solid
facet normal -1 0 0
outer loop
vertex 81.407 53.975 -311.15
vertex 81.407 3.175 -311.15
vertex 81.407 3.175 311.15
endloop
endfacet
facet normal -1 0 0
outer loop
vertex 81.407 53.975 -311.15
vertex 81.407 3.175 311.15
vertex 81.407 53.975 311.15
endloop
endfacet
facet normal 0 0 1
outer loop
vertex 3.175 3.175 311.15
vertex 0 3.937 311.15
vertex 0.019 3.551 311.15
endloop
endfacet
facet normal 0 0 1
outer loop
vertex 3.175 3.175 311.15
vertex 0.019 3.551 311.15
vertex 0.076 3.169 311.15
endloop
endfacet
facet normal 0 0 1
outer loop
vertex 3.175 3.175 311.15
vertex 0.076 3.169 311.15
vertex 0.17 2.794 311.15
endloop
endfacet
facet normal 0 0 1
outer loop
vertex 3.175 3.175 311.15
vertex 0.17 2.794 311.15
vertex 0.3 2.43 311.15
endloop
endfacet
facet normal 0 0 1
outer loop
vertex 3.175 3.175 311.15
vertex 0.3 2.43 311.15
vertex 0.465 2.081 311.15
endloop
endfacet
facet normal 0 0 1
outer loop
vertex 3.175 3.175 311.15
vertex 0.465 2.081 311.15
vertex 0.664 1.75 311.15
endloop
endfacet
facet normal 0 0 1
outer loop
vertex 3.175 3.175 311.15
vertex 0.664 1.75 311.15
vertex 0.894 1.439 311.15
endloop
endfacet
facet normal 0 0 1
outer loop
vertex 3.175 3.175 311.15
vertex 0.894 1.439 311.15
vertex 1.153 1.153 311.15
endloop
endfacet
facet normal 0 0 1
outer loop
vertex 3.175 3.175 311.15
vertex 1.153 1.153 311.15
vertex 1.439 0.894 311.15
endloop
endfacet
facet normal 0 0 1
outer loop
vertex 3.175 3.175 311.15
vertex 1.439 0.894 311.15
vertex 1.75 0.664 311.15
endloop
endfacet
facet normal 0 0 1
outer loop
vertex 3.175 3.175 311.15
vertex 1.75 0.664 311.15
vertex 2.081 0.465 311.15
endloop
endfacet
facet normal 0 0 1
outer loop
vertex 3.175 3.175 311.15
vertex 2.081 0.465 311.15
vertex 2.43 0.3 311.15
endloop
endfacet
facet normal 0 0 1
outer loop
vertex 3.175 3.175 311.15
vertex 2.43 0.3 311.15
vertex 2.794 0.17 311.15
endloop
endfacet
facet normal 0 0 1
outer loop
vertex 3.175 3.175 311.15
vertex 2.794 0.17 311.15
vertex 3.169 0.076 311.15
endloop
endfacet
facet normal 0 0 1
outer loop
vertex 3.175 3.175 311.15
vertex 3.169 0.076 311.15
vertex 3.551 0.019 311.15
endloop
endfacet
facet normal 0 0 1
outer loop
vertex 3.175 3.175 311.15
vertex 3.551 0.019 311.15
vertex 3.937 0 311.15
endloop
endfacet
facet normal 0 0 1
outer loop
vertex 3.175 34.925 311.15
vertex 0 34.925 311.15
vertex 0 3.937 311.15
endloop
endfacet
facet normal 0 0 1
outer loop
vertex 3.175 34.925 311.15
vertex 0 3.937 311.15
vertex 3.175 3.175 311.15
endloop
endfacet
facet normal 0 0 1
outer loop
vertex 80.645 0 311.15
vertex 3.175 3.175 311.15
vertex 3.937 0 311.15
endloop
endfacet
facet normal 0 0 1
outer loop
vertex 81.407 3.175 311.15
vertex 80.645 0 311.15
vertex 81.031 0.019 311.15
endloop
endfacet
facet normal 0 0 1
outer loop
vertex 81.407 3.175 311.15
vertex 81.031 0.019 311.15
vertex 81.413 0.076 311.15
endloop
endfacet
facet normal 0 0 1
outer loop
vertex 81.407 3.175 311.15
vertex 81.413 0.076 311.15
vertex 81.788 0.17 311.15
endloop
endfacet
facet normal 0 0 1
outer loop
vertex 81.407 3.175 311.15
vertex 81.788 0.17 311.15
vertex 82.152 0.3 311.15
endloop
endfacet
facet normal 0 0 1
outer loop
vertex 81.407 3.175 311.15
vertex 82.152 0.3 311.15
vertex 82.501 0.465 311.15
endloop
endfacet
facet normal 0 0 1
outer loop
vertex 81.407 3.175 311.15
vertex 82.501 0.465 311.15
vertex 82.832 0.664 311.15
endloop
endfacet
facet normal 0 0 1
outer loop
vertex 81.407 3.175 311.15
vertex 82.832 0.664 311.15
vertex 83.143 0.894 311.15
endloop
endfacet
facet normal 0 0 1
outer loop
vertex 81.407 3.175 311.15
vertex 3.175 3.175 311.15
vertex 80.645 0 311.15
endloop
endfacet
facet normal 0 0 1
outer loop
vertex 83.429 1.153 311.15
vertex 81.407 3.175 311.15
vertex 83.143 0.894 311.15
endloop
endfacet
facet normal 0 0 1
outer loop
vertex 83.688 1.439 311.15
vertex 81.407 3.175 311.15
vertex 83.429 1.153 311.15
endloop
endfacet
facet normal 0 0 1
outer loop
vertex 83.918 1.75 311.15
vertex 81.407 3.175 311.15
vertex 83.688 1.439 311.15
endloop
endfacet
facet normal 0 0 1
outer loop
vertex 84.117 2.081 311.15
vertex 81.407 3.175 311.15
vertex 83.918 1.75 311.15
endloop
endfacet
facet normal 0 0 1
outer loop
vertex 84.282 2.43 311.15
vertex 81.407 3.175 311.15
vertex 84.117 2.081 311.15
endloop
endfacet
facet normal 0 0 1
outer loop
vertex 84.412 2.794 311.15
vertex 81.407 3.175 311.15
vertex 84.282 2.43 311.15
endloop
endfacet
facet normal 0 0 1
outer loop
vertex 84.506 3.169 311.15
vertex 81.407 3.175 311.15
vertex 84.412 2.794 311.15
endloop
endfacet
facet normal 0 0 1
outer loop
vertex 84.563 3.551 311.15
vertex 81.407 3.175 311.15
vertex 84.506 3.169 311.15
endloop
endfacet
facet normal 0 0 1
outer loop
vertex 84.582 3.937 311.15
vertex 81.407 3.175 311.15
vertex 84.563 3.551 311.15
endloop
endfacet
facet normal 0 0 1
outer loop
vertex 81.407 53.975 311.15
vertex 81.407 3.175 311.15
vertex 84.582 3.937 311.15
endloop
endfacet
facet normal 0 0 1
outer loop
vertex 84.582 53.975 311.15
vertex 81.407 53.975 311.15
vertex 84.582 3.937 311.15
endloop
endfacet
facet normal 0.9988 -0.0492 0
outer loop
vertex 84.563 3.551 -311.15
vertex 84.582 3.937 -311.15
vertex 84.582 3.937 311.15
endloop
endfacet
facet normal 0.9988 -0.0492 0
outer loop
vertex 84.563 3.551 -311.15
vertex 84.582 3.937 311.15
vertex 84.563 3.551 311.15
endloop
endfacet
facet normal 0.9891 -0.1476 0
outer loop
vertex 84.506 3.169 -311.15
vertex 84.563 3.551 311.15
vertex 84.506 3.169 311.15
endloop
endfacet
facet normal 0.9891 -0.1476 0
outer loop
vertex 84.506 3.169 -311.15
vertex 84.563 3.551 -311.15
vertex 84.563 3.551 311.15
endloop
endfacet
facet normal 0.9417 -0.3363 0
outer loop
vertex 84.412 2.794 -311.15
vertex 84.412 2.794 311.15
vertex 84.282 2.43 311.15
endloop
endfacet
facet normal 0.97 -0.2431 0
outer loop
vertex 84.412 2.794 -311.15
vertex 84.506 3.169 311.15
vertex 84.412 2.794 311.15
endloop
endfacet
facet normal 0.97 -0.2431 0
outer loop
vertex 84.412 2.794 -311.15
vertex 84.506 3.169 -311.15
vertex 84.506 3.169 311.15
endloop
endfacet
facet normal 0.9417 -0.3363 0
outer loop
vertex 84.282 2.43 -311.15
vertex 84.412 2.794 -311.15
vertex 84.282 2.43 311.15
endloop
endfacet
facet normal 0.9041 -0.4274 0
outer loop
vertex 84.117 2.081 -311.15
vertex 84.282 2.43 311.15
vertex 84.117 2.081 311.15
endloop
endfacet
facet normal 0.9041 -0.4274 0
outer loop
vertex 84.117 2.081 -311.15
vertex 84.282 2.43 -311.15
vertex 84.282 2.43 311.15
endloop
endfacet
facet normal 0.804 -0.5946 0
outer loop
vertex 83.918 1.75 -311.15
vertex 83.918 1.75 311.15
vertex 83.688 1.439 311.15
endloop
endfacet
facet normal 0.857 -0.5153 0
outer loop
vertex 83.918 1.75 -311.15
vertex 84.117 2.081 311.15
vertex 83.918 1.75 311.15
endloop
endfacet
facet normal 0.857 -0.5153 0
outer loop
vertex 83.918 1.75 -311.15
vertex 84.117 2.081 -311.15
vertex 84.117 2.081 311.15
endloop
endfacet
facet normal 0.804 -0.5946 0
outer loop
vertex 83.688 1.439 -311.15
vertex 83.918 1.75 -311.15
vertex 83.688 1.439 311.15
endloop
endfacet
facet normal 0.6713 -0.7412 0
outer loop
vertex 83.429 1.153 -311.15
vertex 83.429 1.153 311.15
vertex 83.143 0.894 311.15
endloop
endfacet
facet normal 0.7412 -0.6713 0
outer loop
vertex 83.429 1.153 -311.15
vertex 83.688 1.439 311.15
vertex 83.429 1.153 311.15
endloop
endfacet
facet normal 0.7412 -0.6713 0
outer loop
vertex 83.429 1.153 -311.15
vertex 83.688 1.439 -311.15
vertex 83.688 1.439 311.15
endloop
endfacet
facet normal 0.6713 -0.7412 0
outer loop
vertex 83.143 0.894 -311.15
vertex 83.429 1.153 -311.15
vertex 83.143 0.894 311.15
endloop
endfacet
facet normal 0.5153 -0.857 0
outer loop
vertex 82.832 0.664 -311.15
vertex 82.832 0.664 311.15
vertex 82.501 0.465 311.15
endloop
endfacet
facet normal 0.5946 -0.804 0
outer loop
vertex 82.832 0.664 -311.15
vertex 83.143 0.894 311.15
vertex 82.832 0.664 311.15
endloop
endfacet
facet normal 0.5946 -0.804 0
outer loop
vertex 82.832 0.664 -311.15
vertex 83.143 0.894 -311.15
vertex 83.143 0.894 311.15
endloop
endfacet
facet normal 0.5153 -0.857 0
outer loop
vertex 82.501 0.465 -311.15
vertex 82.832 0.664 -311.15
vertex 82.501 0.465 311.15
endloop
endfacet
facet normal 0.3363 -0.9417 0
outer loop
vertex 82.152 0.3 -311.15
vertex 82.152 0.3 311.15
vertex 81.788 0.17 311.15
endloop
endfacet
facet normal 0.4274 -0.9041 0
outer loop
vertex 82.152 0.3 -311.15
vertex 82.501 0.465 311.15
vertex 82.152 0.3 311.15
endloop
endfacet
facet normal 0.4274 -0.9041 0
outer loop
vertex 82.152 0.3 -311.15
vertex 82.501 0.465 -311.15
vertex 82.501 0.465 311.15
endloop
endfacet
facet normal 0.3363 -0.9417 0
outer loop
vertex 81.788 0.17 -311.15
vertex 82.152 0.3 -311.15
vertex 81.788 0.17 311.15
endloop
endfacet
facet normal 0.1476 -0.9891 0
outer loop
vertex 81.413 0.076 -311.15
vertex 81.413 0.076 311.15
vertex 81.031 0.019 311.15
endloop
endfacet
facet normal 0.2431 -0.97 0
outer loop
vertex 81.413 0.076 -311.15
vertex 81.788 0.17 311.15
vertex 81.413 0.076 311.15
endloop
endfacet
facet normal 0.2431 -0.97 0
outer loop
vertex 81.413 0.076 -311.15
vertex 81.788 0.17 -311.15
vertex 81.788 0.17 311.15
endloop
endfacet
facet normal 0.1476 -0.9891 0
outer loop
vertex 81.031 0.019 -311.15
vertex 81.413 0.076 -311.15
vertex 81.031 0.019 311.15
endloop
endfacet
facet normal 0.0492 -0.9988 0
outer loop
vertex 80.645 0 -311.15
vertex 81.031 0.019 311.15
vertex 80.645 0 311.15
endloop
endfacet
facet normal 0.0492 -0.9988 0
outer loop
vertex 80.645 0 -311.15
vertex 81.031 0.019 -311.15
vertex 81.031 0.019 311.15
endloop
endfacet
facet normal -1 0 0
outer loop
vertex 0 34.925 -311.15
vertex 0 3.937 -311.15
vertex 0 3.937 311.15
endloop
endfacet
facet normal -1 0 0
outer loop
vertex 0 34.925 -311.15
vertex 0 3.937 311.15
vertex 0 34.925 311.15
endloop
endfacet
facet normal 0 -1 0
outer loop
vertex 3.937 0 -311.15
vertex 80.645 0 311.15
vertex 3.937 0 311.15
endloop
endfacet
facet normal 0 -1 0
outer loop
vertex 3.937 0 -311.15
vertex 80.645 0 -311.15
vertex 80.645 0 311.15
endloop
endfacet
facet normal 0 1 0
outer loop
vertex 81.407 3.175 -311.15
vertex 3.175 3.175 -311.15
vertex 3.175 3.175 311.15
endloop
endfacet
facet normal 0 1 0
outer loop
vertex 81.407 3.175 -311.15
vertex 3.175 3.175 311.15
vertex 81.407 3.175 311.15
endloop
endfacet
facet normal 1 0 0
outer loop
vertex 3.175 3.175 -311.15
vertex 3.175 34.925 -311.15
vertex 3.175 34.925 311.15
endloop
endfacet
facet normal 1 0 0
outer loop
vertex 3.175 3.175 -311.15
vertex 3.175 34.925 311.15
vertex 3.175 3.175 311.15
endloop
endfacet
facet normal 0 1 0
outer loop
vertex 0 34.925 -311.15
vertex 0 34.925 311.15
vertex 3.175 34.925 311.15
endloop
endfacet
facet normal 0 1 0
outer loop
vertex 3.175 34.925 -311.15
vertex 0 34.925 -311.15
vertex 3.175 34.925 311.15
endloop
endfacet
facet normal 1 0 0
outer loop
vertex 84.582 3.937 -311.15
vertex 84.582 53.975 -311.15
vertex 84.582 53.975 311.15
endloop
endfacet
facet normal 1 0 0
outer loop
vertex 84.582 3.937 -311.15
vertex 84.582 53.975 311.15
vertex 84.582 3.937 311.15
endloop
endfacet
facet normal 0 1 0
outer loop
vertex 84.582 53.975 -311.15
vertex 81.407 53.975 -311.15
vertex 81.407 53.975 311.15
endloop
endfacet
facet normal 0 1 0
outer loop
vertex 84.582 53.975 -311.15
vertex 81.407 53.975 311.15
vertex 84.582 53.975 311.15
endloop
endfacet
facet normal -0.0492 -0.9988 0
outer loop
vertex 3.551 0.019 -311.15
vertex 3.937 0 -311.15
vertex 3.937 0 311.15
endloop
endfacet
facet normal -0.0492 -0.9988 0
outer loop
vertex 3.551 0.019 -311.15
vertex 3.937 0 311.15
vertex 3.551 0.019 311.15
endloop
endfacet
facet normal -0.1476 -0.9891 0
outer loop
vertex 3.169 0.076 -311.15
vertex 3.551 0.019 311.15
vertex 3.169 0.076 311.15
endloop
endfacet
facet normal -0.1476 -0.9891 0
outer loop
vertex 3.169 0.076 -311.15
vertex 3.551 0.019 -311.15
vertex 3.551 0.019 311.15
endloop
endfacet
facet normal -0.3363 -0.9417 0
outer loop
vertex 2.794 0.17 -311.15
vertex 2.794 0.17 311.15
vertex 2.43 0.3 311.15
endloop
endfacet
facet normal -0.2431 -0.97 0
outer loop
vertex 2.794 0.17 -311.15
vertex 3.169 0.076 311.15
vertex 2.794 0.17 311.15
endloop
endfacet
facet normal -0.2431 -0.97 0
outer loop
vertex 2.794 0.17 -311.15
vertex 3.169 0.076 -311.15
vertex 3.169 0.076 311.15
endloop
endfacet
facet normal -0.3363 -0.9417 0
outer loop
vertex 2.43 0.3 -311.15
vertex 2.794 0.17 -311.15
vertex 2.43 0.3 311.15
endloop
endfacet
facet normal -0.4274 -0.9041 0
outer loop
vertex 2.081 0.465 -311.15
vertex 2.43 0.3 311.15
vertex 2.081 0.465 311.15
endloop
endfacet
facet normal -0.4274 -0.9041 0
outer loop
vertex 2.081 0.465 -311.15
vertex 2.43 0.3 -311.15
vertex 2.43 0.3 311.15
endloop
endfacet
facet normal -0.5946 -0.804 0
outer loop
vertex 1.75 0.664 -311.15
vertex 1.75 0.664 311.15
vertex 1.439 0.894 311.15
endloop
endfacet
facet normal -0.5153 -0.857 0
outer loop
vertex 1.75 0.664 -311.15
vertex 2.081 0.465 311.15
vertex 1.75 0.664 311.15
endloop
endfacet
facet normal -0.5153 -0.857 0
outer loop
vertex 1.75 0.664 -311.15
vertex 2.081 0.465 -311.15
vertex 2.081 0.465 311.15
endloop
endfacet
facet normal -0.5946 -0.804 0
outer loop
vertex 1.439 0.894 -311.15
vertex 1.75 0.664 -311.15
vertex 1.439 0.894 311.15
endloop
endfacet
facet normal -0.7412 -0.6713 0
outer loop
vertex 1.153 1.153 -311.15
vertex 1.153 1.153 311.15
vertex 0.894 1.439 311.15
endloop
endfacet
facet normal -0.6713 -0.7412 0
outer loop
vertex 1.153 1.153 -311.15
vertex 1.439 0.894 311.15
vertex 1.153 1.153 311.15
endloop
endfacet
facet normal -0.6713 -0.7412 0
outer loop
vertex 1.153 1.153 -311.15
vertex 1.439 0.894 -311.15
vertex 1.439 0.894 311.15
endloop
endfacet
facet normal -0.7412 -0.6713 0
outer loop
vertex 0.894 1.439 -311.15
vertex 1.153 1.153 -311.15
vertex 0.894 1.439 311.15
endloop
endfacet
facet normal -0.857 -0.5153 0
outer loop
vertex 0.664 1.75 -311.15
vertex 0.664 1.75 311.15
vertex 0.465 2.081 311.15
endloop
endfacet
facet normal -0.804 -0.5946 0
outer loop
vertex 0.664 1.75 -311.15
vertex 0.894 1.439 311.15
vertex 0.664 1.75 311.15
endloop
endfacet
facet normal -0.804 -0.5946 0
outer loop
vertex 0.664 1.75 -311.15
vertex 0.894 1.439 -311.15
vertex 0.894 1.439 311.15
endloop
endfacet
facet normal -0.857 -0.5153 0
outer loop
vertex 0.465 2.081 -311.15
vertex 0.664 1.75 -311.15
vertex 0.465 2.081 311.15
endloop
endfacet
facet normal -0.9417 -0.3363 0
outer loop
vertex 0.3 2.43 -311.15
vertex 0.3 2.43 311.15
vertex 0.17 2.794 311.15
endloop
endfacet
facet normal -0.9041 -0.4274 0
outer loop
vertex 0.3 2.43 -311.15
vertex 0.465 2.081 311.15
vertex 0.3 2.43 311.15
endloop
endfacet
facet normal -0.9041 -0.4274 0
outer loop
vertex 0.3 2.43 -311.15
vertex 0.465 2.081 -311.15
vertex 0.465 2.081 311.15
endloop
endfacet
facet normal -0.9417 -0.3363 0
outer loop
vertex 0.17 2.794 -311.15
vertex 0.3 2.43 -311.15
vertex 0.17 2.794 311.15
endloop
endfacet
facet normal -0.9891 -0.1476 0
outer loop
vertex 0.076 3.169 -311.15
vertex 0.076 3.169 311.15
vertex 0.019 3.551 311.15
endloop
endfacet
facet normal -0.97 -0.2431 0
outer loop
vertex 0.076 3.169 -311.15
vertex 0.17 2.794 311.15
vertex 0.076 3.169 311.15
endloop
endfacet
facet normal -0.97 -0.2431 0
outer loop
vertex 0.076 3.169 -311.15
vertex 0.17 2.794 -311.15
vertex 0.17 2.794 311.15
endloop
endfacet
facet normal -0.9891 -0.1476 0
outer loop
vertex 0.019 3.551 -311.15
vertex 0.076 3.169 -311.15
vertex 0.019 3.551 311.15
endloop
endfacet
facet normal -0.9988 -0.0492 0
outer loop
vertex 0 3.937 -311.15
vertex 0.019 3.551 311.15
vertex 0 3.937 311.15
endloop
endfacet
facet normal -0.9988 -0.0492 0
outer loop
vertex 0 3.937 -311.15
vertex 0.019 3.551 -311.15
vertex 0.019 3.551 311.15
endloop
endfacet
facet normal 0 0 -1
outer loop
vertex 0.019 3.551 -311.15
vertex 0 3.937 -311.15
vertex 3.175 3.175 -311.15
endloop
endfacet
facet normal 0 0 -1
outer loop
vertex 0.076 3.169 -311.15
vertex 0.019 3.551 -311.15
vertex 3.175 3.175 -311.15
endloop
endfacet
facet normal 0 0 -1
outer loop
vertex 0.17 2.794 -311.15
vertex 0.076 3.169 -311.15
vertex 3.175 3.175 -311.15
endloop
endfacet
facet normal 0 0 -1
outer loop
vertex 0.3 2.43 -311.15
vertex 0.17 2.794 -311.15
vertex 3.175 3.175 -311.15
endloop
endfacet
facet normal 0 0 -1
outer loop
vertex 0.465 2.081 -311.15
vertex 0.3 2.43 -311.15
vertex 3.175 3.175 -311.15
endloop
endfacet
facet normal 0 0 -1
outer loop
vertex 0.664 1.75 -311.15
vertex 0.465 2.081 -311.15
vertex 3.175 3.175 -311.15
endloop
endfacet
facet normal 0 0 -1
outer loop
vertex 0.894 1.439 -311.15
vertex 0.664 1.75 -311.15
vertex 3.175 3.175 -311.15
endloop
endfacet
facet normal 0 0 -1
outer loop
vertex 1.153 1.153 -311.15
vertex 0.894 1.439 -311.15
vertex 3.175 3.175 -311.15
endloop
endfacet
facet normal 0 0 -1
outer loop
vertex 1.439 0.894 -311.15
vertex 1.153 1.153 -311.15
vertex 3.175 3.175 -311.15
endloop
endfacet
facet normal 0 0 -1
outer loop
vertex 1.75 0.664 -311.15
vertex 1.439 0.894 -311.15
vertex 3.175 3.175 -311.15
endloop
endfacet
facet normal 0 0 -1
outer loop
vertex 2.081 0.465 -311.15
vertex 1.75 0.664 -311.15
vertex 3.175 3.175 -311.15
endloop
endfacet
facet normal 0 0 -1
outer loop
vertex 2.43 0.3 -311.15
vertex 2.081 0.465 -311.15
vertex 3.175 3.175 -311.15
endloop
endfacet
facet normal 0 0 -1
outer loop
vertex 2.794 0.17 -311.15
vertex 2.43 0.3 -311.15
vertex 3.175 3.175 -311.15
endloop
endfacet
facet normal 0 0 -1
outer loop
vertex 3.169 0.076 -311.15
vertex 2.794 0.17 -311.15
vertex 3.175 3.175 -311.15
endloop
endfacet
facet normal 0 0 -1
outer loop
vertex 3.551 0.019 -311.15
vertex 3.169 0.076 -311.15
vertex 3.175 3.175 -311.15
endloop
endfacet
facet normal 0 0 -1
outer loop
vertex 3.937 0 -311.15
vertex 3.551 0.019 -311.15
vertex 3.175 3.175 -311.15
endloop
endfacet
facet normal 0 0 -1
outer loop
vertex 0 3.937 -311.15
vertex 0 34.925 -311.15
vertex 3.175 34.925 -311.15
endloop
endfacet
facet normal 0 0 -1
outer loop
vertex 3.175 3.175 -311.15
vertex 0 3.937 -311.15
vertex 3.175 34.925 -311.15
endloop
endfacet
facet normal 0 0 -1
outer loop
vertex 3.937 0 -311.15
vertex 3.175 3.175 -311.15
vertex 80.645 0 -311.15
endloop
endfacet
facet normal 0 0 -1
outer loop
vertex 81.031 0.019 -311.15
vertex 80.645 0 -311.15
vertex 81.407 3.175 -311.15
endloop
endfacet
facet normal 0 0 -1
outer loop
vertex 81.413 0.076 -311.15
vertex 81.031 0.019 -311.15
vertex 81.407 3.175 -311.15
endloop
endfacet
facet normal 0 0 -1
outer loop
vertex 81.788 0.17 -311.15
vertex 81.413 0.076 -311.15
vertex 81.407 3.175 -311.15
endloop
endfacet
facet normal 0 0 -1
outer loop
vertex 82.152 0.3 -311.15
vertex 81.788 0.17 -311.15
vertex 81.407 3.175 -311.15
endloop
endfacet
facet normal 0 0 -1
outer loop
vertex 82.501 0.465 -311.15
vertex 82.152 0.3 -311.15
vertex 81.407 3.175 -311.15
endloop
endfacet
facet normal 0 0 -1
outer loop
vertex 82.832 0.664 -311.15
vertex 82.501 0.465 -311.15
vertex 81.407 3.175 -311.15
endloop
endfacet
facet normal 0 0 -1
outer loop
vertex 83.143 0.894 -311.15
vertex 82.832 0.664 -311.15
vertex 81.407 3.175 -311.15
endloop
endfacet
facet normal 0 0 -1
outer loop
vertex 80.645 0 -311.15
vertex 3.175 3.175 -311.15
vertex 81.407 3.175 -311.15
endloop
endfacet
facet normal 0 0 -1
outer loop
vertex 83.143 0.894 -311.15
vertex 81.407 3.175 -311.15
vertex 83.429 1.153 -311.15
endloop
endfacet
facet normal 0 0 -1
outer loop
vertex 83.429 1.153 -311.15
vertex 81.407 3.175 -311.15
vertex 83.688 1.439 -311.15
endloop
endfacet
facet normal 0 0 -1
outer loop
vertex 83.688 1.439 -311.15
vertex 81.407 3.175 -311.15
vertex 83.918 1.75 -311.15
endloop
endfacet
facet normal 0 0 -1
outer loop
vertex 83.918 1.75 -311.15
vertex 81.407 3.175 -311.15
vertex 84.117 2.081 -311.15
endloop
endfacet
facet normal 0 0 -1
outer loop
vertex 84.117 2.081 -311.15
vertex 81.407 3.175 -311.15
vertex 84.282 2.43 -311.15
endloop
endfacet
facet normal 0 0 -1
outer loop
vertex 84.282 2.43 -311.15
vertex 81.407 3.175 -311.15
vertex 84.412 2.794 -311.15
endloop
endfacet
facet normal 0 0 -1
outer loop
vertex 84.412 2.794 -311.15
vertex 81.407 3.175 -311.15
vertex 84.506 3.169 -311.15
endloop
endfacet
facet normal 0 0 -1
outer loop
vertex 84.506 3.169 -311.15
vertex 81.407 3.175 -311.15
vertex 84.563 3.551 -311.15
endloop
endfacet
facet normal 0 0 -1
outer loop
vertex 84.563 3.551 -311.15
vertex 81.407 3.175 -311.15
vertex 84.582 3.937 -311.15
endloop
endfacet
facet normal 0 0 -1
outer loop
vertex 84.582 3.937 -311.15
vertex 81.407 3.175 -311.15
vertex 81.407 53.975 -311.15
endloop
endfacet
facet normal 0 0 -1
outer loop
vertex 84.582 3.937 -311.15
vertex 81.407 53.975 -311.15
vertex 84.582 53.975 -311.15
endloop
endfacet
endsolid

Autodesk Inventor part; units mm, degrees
ref_plane "YZ Plane" through (0, 0, 0) normal (1, 0, 0) x (0, 1, 0)
ref_plane "XZ Plane" through (0, 0, 0) normal (0, 1, 0) x (-1, 0, 0)
sketch "Sketch1" plane through (0, 0, 0) normal (0, 0, 1) x (1, 0, 0)
  line L0 (0, 3.937) -> (0, 34.925)
  line L1 (0, 34.925) -> (3.175, 34.925)
  line L2 (3.175, 34.925) -> (3.175, 3.175)
  line L3 (3.175, 3.175) -> (81.407, 3.175)
  line L4 (81.407, 3.175) -> (81.407, 53.975)
  line L5 (81.407, 53.975) -> (84.582, 53.975)
  line L6 (84.582, 53.975) -> (84.582, 3.937)
  line L7 (80.645, 0) -> (3.937, 0)
  arc A0 (80.645, 0) -> (84.582, 3.937) centre (80.645, 3.937) ccw
  arc A1 (0, 3.937) -> (3.937, 0) centre (3.937, 3.937) ccw
  point P0 (0, 0)
  dimension "d0" = 34.925
  dimension "d1" = 3.175
  dimension "d2" = 31.75
  dimension "d3" = 78.232
  dimension "d4" = 50.8
  dimension "d5" = 3.175
  dimension "d6" = 3.937
  dimension "d7" = 3.937
extrude "Extrusion1" add sketch "Sketch1" along normal mid plane 622.3
properties part number "2020 End Plate"
